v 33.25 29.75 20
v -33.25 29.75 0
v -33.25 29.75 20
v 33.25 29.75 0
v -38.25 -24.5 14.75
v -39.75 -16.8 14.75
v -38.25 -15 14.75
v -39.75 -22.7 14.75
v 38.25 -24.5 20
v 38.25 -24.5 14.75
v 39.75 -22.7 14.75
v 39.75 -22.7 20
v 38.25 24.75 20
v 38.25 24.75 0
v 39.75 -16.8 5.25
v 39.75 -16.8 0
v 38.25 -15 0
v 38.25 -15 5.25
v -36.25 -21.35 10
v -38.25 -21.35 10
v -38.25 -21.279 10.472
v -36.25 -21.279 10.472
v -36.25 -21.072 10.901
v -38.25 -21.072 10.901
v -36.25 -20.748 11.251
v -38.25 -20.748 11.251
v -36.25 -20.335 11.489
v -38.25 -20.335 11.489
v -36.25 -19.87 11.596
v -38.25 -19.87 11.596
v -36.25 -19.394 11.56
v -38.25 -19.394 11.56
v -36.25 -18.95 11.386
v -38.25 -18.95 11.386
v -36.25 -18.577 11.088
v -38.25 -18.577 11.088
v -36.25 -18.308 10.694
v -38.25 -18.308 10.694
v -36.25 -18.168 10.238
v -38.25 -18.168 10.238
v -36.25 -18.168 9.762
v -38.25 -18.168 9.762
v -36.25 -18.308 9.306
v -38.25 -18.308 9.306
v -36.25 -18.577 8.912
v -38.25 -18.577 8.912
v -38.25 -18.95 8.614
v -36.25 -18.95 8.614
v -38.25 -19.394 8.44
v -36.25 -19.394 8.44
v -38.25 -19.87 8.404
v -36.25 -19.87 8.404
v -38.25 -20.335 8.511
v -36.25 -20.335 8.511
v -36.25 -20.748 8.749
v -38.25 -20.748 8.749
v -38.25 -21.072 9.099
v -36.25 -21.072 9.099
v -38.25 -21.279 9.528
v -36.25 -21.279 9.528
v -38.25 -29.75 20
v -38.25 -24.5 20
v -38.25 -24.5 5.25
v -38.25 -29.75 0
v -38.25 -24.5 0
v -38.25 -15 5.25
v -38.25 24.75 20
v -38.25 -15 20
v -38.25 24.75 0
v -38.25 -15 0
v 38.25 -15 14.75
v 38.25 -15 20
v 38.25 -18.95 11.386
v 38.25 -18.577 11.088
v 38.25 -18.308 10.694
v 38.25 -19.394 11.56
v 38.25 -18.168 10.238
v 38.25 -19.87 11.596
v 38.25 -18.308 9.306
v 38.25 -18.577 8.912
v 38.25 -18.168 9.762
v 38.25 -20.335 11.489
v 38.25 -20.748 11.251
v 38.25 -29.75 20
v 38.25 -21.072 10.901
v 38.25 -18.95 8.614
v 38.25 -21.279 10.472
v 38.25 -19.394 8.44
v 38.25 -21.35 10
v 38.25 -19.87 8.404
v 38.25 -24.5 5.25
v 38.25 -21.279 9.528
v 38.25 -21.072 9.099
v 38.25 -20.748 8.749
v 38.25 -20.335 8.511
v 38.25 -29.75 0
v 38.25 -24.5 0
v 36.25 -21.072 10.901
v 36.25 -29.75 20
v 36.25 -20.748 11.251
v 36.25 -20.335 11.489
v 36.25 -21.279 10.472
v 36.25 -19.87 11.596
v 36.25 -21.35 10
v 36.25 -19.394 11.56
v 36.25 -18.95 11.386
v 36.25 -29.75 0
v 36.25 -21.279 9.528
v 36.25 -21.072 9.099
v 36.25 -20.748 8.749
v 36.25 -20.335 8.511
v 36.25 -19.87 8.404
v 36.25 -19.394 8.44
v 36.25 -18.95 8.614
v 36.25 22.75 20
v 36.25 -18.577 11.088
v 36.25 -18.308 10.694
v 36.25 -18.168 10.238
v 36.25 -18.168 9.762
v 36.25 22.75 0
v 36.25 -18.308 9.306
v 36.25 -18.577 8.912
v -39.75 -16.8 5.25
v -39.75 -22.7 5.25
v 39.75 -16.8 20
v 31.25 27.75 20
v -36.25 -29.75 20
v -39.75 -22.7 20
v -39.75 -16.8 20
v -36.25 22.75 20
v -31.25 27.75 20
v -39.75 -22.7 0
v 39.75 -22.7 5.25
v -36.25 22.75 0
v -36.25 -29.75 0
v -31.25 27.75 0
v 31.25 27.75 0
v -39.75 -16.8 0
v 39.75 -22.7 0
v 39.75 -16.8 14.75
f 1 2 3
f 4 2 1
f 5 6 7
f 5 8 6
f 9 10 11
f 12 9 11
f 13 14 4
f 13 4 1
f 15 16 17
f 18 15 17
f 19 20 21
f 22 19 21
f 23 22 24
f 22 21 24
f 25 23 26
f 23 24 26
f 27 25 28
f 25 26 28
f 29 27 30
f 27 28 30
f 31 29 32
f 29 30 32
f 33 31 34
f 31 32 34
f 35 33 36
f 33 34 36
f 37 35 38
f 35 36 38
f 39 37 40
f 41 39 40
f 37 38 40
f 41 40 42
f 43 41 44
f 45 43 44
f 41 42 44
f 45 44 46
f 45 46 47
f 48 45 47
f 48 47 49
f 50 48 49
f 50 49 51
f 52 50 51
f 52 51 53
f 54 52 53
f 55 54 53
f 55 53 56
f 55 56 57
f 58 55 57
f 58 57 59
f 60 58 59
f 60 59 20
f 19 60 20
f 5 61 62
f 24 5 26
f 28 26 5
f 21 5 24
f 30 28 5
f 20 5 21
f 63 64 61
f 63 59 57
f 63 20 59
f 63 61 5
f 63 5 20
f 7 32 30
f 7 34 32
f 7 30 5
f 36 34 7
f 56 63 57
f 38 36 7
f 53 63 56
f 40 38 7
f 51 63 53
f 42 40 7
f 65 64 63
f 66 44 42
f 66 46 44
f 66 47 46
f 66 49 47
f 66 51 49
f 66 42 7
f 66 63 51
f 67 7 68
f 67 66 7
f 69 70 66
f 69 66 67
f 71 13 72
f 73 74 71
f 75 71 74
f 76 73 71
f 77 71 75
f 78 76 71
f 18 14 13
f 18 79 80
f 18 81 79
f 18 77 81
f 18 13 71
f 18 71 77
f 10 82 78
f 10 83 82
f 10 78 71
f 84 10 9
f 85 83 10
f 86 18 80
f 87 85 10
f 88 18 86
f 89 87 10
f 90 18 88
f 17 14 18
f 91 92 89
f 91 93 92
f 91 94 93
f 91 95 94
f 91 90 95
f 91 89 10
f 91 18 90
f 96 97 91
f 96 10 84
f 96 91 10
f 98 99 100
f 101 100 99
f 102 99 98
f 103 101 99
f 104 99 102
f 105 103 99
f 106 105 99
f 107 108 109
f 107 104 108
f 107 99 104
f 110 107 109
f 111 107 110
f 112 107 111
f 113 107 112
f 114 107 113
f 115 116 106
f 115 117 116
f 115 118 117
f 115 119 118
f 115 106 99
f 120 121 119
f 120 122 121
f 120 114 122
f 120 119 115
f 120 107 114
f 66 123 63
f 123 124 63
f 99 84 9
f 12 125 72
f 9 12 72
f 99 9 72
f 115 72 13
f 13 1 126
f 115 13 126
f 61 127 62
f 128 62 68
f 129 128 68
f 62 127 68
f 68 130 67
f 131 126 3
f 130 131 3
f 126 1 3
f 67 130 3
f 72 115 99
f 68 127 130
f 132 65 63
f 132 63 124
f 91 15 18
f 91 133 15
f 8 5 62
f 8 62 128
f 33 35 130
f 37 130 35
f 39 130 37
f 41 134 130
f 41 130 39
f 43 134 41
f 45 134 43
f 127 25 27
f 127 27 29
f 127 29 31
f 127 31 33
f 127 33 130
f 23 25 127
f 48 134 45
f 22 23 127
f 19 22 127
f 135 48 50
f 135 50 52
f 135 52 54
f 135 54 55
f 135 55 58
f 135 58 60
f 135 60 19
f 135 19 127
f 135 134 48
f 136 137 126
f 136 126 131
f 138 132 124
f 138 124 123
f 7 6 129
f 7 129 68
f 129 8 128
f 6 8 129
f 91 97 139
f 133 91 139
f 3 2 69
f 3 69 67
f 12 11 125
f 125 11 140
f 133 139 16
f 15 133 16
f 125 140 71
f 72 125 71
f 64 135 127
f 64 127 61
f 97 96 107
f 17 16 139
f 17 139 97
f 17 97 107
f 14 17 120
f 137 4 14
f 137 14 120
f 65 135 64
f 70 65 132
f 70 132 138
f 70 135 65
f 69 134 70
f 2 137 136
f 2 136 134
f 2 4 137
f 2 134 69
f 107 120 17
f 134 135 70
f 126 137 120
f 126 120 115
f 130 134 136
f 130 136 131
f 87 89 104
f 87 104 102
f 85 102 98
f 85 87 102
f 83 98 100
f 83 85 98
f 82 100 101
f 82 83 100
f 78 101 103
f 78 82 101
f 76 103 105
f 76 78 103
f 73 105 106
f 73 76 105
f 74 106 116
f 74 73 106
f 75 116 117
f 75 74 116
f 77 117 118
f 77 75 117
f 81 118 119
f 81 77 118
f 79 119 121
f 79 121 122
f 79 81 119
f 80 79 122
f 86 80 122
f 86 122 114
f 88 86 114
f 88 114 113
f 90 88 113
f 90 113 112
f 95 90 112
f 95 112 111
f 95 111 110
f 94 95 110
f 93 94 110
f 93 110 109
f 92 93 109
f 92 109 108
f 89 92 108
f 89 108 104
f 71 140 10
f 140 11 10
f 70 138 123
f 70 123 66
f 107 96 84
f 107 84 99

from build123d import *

# Parameters (mm, degrees)
PAD_DEPTH       = 20
PAD001_DEPTH    = 20
SKETCH002_R     = 1.6
POCKET_DEPTH    = 3.5
SKETCH003_W     = 9.5
SKETCH003_H     = 9.5
POCKET001_DEPTH = 1.5
CHAMFER_SIZE    = 5


with BuildPart() as part:
    # Sketch → Pad (new body)
    with BuildSketch(Plane.XY):
        Polygon((-38.25, -29.75), (-38.25, 29.75), (38.25, 29.75), (38.25, -29.75), (36.25, -29.75), (36.25, 27.75), (-36.25, 27.75), (-36.25, -29.75), align=None)
    extrude(amount=PAD_DEPTH)

    # Sketch001 (on Face9 of Pad) → Pad001 (join)
    with BuildSketch(Plane(origin=(0, 0, 0), x_dir=(1, 0, 0), z_dir=(0, 0, -1))):
        Polygon((-38.25, 24.5), (-39.75, 22.7), (-39.75, 16.8), (-38.25, 15), align=None)
    pad001 = extrude(amount=-PAD001_DEPTH)

    # Sketch002 (on Face14 of Pad001) → Pocket (cut)
    with BuildSketch(Plane(origin=(-39.75, 0, 0), x_dir=(0, -1, 0), z_dir=(-1, 0, 0))):
        with Locations((19.75, 10)):
            Circle(SKETCH002_R)
    pocket = extrude(amount=-POCKET_DEPTH, mode=Mode.SUBTRACT)

    # Sketch003 (on Face14 of Pocket) → Pocket001 (cut)
    with BuildSketch(Plane(origin=(-39.75, 0, 0), x_dir=(0, -1, 0), z_dir=(-1, 0, 0))):
        with Locations((19.75, 10)):
            Rectangle(SKETCH003_W, SKETCH003_H)
    pocket001 = extrude(amount=-POCKET001_DEPTH, mode=Mode.SUBTRACT)

    # Mirrored: Pad001, Pocket, Pocket001 across YZ
    add(pad001.mirror(Plane.YZ))
    add(pocket.mirror(Plane.YZ), mode=Mode.SUBTRACT)
    add(pocket001.mirror(Plane.YZ), mode=Mode.SUBTRACT)

    # Chamfer
    chamfer_edges = [part.edges().sort_by_distance(p)[0] for p in [
        (36.25, 27.75, 10),
        (-36.25, 27.75, 10),
        (-38.25, 29.75, 10),
        (38.25, 29.75, 10),
    ]]
    chamfer(chamfer_edges, length=CHAMFER_SIZE)


solid = part.part
